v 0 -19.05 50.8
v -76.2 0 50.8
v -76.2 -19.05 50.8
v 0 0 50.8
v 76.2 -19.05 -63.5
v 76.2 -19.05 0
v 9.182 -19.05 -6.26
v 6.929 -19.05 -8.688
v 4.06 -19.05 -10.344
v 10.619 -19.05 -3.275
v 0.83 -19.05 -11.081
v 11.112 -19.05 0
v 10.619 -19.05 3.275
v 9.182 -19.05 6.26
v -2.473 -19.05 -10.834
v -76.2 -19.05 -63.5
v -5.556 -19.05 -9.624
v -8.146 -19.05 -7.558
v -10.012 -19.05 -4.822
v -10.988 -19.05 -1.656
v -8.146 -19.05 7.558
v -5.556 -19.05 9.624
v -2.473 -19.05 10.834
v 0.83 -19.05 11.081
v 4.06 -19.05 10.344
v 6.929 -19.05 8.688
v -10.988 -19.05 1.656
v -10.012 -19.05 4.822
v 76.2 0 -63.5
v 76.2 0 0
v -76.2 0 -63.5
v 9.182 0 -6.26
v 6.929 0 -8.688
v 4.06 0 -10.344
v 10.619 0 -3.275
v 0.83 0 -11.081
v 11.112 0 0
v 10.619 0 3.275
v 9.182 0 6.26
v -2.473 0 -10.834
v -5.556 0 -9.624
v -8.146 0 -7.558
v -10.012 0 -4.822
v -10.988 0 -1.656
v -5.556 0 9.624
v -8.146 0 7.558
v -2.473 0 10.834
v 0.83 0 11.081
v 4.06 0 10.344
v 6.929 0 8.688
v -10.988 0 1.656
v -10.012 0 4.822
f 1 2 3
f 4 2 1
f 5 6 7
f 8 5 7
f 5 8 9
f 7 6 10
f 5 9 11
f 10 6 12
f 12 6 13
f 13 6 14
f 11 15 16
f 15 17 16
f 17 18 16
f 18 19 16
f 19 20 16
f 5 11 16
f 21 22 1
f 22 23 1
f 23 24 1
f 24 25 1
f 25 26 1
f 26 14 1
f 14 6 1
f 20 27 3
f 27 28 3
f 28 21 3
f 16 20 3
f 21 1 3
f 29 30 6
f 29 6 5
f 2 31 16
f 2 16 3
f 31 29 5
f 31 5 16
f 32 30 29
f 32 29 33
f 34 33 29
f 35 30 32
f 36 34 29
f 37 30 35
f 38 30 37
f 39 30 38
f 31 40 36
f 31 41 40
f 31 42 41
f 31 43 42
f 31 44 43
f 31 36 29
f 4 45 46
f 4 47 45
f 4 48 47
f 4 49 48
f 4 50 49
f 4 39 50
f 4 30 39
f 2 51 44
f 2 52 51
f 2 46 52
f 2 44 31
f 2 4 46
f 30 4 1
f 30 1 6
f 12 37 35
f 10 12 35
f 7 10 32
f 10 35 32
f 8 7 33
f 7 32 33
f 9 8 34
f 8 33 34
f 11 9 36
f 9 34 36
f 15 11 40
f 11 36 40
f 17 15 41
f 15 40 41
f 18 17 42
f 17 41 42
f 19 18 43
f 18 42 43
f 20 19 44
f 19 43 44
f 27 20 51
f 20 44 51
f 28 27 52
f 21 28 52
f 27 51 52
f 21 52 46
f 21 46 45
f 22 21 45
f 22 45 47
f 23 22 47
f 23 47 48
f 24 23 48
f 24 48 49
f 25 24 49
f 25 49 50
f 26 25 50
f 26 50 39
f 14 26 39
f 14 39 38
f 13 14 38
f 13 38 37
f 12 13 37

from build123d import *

# Parameters (mm, degrees)
PAD_DEPTH    = 19.05
SKETCH001_R  = 11.1125
POCKET_DEPTH = 19.051


with BuildPart() as part:
    # Sketch → Pad (new body)
    with BuildSketch(Plane.XZ):
        Polygon((-76.2, -63.5), (-76.2, 50.8), (0, 50.8), (76.2, 0), (76.2, -63.5), align=None)
    extrude(amount=PAD_DEPTH)

    # Sketch001 (on Face6 of Pad) → Pocket (cut, through all)
    with BuildSketch(Plane(origin=(0, 0, 0), x_dir=(1, 0, 0), z_dir=(0, 1, 0))):
        Circle(SKETCH001_R)
    extrude(amount=-POCKET_DEPTH, mode=Mode.SUBTRACT)


solid = part.part
